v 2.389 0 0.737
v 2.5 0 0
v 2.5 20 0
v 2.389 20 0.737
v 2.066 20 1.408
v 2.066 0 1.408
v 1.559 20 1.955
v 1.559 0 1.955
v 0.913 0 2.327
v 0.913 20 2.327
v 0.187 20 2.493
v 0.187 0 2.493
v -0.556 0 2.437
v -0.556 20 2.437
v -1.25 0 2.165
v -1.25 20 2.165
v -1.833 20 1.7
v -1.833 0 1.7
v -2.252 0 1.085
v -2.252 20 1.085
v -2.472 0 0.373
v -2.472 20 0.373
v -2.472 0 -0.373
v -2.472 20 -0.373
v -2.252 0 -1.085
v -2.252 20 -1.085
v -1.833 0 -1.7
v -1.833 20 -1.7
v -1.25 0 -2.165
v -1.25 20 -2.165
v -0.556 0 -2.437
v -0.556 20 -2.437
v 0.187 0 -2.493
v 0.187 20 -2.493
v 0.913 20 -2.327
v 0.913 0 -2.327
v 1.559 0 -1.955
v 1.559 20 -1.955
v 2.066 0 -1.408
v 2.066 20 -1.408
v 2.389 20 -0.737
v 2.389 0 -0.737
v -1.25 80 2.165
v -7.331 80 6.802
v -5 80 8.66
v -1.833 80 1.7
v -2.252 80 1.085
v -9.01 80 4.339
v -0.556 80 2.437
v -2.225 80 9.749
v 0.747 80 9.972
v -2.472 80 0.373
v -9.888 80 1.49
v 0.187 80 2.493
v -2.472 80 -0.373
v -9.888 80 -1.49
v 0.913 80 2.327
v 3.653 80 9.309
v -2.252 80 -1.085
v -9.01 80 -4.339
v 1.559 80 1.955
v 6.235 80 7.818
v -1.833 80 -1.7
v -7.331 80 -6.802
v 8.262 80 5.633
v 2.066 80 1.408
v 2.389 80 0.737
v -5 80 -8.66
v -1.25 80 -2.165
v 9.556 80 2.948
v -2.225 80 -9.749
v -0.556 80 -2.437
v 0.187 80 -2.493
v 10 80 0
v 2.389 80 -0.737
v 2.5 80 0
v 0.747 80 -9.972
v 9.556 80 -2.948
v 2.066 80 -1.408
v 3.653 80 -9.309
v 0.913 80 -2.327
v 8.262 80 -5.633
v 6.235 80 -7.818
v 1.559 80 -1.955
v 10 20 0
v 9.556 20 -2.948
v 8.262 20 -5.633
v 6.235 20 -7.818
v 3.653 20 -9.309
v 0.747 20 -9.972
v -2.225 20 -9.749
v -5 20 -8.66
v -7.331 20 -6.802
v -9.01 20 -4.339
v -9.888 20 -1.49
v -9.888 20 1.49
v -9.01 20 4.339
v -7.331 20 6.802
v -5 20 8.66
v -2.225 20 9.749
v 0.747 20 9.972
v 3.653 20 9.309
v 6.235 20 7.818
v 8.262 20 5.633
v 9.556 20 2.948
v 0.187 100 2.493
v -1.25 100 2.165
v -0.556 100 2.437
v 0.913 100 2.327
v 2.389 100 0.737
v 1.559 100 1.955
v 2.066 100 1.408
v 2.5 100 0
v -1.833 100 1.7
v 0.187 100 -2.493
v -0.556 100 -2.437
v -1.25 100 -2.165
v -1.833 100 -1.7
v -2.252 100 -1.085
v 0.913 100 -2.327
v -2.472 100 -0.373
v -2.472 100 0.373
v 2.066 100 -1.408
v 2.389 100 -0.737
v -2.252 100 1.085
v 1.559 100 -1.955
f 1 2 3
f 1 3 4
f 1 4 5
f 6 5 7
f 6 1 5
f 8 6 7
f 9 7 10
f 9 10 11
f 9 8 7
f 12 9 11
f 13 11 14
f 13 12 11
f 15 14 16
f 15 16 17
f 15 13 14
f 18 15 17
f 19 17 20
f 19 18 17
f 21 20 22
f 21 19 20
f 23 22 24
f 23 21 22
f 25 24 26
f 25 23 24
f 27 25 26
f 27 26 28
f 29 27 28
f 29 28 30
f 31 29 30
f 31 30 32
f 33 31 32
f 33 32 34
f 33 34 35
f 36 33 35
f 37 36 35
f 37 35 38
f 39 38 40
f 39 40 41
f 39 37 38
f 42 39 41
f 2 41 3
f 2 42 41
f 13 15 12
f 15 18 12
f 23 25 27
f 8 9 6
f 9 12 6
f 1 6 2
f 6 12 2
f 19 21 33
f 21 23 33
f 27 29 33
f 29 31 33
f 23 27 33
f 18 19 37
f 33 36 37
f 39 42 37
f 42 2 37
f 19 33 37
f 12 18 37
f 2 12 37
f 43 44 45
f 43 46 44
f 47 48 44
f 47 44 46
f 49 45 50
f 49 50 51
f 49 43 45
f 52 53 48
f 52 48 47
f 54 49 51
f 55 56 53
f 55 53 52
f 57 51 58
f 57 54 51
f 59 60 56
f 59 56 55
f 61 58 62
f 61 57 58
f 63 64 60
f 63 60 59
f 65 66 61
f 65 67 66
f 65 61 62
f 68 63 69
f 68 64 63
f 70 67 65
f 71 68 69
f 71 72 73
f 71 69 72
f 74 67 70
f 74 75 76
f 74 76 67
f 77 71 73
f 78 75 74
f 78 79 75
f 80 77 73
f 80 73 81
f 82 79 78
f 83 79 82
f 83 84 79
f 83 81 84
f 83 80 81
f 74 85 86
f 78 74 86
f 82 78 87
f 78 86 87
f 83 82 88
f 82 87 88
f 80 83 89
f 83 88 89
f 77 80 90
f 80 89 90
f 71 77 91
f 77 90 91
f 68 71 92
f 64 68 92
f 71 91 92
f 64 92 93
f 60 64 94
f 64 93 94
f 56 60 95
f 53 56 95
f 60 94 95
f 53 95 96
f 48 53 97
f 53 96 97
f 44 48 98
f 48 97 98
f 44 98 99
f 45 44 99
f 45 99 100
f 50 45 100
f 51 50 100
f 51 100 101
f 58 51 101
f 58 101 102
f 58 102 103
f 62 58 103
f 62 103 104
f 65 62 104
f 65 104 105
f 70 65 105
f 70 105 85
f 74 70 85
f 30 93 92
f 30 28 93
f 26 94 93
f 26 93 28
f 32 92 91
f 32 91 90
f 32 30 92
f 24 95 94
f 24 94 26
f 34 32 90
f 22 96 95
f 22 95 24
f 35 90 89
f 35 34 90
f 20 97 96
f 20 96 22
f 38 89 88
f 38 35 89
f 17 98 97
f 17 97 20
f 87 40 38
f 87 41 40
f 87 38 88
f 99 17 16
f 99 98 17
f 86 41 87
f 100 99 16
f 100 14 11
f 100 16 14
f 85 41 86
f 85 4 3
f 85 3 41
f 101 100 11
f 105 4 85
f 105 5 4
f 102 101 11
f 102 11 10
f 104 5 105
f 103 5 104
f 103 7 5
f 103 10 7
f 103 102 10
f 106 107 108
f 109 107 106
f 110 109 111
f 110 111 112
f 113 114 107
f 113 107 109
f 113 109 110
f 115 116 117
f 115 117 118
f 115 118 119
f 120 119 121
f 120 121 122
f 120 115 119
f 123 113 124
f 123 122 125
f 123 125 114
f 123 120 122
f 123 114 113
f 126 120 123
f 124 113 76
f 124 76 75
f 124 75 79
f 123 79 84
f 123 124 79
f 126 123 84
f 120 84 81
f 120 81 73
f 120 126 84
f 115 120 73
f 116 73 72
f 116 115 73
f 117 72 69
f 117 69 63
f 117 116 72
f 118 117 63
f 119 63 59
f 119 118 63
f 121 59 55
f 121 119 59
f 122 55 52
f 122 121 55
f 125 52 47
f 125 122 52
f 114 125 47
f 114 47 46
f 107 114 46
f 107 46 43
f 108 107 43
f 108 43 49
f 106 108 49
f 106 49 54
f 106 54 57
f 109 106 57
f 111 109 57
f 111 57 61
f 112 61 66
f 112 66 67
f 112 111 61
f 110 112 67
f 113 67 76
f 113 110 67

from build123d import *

# Parameters (mm, degrees)
SKETCH1_R           = 10
BOSS_EXTRUDE1_DEPTH = 100
SKETCH2_R           = 10
SKETCH2_R_2         = 2.5
CUT_EXTRUDE2_DEPTH  = 20
SKETCH3_R           = 10
SKETCH3_R_2         = 2.5
CUT_EXTRUDE3_DEPTH  = 20


with BuildPart() as part:
    # Sketch1 → Boss-Extrude1 (new body)
    with BuildSketch(Plane(origin=(0, 0, 0), x_dir=(1, 0, 0), z_dir=(0, 1, 0))):
        Circle(SKETCH1_R)
    extrude(amount=BOSS_EXTRUDE1_DEPTH)

    # Sketch2 → Cut-Extrude2 (cut)
    with BuildSketch(Plane(origin=(0, 100, 0), x_dir=(1, 0, 0), z_dir=(0, 1, 0))):
        Circle(SKETCH2_R)
        Circle(SKETCH2_R_2, mode=Mode.SUBTRACT)
    extrude(amount=-CUT_EXTRUDE2_DEPTH, mode=Mode.SUBTRACT)

    # Sketch3 → Cut-Extrude3 (cut)
    with BuildSketch(Plane.XZ):
        Circle(SKETCH3_R)
        Circle(SKETCH3_R_2, mode=Mode.SUBTRACT)
    extrude(amount=-CUT_EXTRUDE3_DEPTH, mode=Mode.SUBTRACT)


solid = part.part
